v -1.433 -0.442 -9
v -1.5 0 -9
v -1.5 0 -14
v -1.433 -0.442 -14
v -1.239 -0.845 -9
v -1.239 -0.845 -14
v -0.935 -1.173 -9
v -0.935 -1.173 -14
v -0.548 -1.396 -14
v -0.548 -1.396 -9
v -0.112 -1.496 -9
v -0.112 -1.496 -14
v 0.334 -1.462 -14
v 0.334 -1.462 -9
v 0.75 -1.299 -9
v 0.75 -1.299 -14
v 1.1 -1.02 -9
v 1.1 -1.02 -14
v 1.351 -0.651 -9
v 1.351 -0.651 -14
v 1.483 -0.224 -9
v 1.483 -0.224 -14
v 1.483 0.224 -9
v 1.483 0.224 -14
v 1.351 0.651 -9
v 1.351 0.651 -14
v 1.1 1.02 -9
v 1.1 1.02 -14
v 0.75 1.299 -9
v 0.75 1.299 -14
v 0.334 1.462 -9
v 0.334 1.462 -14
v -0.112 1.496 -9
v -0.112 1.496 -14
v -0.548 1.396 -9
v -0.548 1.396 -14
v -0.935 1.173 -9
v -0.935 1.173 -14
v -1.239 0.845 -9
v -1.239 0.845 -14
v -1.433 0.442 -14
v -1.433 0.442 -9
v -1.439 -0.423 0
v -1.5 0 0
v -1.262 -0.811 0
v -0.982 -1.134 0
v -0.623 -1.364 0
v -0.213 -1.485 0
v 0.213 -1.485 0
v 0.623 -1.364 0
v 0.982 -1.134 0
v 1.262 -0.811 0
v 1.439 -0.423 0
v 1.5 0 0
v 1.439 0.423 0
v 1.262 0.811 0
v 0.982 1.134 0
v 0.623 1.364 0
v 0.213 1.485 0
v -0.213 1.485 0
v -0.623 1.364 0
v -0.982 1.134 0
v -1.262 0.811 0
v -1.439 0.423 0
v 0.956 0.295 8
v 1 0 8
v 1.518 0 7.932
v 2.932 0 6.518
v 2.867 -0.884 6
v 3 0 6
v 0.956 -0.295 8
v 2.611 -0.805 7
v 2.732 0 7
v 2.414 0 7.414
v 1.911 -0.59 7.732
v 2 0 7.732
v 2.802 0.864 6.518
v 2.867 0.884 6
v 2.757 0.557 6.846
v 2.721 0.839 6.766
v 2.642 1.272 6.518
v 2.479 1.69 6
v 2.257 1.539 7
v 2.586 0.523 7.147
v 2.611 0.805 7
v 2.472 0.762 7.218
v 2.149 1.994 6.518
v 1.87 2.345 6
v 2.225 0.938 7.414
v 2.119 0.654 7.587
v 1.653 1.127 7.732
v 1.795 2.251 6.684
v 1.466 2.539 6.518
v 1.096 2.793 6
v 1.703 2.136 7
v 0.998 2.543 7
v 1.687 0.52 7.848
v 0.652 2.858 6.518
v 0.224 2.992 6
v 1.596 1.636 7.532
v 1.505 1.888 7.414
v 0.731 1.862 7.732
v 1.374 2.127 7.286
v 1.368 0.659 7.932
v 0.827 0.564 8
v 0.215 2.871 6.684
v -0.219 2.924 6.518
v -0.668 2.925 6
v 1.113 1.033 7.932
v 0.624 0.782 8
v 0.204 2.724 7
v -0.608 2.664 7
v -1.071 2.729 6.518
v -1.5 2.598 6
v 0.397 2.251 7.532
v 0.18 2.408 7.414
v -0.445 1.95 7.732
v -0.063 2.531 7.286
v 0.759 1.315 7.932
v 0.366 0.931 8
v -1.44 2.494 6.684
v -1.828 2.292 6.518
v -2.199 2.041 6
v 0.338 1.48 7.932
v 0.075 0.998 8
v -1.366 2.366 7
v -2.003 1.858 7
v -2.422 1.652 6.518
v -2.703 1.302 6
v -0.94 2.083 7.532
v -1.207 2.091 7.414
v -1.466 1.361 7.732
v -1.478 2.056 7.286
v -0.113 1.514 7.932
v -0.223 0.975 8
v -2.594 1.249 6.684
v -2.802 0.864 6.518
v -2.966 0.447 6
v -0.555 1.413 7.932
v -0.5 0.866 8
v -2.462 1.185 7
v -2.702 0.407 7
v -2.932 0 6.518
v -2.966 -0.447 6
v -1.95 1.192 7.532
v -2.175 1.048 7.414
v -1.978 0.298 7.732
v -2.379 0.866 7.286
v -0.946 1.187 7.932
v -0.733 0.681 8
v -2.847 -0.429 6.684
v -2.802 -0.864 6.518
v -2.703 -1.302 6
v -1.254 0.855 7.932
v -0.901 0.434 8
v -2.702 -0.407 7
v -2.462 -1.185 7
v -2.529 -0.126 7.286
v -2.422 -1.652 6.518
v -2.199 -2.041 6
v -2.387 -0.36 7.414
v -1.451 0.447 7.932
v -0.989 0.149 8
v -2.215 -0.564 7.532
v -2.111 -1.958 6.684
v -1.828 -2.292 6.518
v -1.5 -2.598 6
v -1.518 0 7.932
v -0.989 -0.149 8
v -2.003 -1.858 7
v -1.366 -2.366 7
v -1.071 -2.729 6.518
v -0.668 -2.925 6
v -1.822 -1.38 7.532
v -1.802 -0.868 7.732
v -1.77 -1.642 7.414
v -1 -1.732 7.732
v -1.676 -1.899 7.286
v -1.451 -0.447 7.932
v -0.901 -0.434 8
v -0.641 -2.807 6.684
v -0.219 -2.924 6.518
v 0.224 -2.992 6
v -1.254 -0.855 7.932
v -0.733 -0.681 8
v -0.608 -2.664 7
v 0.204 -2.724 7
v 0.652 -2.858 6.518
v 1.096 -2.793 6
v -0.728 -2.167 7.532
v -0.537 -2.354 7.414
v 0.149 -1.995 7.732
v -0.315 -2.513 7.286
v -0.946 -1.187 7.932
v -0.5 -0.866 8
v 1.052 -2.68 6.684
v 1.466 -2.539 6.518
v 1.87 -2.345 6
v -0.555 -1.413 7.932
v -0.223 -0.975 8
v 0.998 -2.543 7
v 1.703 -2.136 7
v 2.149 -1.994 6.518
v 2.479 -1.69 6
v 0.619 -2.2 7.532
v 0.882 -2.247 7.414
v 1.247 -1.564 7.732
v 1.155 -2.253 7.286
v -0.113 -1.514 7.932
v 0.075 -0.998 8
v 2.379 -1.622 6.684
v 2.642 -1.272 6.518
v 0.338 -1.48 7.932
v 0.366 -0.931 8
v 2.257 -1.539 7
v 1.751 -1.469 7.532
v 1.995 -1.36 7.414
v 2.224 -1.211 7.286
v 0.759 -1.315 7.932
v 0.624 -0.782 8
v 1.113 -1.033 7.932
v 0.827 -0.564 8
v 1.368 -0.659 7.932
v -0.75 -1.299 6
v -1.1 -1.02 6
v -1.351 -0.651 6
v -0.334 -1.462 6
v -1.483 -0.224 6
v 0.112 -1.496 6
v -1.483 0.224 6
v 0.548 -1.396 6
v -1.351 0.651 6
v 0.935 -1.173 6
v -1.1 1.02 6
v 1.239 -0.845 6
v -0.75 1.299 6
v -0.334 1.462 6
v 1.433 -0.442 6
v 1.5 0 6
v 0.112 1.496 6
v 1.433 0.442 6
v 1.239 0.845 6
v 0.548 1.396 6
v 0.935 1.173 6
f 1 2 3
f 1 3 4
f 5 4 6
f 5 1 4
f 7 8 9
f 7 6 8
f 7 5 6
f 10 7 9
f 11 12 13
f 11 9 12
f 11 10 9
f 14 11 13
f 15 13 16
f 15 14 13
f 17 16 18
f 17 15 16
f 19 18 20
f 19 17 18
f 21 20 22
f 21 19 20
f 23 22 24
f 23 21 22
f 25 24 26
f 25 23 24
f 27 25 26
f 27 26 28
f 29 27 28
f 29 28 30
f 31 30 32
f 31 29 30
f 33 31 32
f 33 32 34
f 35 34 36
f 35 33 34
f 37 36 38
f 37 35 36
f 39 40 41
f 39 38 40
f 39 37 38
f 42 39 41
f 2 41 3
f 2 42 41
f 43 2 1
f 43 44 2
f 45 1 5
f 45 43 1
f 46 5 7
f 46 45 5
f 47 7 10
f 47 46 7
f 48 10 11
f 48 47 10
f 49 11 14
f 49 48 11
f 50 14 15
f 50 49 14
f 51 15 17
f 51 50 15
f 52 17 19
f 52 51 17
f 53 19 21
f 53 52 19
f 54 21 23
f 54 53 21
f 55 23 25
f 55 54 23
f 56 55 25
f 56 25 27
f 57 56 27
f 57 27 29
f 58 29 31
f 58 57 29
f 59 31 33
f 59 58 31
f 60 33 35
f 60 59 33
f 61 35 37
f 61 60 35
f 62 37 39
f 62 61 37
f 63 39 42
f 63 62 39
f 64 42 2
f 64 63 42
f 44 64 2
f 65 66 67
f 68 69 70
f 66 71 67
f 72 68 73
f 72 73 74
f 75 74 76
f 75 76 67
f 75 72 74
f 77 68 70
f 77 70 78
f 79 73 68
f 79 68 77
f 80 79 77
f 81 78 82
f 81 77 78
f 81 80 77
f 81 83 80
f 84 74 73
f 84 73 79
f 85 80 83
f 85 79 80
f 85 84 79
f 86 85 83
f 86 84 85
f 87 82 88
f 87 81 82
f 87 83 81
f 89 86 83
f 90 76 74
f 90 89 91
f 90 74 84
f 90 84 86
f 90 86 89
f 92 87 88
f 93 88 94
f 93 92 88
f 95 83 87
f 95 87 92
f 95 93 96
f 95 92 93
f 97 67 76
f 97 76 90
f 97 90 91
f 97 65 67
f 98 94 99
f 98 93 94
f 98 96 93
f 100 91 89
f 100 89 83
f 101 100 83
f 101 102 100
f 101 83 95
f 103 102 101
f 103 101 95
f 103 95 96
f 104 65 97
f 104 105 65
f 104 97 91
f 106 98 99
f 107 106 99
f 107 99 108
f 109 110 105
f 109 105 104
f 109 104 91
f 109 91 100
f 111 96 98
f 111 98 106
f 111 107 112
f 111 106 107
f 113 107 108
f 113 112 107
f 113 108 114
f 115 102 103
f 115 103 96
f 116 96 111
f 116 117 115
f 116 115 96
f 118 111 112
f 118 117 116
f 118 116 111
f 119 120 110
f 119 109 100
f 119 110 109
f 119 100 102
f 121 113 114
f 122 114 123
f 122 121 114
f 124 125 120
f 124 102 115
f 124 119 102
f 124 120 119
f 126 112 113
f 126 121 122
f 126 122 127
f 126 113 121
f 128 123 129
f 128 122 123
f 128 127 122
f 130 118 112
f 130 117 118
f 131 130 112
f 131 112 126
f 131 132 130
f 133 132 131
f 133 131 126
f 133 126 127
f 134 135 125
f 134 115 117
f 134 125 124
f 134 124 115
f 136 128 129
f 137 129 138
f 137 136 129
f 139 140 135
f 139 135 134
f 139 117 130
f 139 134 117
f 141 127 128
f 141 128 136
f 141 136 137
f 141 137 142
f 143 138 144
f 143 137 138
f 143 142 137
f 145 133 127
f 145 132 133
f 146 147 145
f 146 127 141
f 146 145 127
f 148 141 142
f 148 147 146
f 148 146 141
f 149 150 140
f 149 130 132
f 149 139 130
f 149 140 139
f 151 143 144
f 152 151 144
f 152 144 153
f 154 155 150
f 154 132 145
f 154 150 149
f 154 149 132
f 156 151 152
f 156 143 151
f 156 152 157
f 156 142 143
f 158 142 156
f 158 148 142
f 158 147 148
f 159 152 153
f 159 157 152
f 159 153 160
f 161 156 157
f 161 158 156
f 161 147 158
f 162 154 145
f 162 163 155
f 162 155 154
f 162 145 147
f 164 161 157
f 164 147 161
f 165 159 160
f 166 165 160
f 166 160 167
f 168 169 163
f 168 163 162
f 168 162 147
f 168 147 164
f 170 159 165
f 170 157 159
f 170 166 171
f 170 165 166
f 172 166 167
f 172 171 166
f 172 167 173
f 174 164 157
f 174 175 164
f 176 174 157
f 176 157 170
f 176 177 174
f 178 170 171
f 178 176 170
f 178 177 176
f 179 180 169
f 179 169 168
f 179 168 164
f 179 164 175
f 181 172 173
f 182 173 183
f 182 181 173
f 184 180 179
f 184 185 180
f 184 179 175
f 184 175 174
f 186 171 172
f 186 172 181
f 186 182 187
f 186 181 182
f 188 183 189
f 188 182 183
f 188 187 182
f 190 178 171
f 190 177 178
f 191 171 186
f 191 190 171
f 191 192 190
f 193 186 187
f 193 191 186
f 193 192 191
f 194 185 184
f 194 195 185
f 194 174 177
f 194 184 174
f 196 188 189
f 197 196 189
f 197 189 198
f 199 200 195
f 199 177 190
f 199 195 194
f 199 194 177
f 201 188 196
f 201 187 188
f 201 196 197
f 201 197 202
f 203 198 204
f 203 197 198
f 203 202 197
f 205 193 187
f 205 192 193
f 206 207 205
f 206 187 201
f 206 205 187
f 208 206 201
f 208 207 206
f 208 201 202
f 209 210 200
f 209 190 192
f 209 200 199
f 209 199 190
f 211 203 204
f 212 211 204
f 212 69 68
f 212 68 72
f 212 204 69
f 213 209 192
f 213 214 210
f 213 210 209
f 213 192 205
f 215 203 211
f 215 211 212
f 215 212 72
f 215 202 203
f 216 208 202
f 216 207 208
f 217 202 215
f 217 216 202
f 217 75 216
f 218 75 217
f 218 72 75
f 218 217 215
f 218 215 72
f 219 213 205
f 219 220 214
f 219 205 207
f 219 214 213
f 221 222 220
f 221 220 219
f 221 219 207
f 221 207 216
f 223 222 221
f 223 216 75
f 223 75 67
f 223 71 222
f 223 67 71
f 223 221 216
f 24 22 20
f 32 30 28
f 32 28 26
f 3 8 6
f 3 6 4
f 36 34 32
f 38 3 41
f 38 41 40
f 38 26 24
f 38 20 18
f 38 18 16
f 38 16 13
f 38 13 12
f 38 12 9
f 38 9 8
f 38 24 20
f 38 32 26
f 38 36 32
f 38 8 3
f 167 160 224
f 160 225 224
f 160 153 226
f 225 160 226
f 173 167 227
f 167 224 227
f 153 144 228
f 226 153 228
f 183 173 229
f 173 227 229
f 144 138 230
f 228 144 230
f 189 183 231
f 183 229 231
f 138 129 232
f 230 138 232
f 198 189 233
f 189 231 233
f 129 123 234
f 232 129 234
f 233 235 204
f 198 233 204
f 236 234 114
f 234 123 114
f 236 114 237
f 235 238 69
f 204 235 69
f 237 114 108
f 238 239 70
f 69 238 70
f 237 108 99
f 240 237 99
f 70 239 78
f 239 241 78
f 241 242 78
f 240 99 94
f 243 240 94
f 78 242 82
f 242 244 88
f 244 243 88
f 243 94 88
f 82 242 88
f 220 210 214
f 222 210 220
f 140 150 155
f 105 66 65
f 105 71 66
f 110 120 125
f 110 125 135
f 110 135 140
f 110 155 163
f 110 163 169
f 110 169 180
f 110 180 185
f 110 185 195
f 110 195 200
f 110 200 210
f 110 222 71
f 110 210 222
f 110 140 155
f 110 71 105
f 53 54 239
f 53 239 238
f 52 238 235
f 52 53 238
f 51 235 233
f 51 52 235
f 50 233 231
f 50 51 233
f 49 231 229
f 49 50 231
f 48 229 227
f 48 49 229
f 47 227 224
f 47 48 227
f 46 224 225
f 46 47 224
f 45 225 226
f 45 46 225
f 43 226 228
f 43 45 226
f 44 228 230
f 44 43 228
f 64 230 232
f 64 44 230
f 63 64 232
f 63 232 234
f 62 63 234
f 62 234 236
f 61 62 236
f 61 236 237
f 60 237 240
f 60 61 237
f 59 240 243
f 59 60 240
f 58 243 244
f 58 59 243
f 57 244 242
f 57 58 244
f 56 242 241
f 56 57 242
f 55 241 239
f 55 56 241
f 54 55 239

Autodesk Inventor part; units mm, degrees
ref_plane "YZ Plane" through (0, 0, 0) normal (1, 0, 0) x (0, 1, 0)
ref_plane "XZ Plane" through (0, 0, 0) normal (0, 1, 0) x (-1, 0, 0)
ref_plane "XY Plane" through (0, 0, 0) normal (0, 0, 1) x (1, 0, 0)
sketch "スケッチ1" plane through (0, 0, 0) normal (0, 0, 1) x (1, 0, 0)
  circle A0 centre (0, 0) radius 1.5
  dimension "d0" = 3
extrude "押し出し1" add sketch "スケッチ1" along normal blind 6
sketch "スケッチ2" plane through (0, 0, 6) normal (0, 0, 1) x (1, 0, 0)
  circle A0 centre (0, 0) radius 1.5 projected
  circle A1 centre (0, 0) radius 3
  dimension "d3" = 6
extrude "押し出し2" add sketch "スケッチ2" along normal blind 2 contours A0 | A1
fillet "フィレット1" radius 2 1 edges at (-3, 0, 8)
thread "ねじ1" size "M3x0.5" class "6g" standard "ANSI Metric M Profile" full length
sketch "スケッチ3" plane through (0, 0, 0) normal (0, 0, -1) x (-1, 0, 0)
  circle A0 centre (0, 0) radius 1.5 projected
extrude "押し出し3" add sketch "スケッチ3" along normal blind 9
sketch "スケッチ4" plane through (0, 0, -9) normal (0, 0, -1) x (-1, 0, 0)
  circle A0 centre (0, 0) radius 1.5 projected
extrude "押し出し4" add sketch "スケッチ4" along normal blind 5
properties part number "SB　20mmなべネジ" material "Steel, Mild"
